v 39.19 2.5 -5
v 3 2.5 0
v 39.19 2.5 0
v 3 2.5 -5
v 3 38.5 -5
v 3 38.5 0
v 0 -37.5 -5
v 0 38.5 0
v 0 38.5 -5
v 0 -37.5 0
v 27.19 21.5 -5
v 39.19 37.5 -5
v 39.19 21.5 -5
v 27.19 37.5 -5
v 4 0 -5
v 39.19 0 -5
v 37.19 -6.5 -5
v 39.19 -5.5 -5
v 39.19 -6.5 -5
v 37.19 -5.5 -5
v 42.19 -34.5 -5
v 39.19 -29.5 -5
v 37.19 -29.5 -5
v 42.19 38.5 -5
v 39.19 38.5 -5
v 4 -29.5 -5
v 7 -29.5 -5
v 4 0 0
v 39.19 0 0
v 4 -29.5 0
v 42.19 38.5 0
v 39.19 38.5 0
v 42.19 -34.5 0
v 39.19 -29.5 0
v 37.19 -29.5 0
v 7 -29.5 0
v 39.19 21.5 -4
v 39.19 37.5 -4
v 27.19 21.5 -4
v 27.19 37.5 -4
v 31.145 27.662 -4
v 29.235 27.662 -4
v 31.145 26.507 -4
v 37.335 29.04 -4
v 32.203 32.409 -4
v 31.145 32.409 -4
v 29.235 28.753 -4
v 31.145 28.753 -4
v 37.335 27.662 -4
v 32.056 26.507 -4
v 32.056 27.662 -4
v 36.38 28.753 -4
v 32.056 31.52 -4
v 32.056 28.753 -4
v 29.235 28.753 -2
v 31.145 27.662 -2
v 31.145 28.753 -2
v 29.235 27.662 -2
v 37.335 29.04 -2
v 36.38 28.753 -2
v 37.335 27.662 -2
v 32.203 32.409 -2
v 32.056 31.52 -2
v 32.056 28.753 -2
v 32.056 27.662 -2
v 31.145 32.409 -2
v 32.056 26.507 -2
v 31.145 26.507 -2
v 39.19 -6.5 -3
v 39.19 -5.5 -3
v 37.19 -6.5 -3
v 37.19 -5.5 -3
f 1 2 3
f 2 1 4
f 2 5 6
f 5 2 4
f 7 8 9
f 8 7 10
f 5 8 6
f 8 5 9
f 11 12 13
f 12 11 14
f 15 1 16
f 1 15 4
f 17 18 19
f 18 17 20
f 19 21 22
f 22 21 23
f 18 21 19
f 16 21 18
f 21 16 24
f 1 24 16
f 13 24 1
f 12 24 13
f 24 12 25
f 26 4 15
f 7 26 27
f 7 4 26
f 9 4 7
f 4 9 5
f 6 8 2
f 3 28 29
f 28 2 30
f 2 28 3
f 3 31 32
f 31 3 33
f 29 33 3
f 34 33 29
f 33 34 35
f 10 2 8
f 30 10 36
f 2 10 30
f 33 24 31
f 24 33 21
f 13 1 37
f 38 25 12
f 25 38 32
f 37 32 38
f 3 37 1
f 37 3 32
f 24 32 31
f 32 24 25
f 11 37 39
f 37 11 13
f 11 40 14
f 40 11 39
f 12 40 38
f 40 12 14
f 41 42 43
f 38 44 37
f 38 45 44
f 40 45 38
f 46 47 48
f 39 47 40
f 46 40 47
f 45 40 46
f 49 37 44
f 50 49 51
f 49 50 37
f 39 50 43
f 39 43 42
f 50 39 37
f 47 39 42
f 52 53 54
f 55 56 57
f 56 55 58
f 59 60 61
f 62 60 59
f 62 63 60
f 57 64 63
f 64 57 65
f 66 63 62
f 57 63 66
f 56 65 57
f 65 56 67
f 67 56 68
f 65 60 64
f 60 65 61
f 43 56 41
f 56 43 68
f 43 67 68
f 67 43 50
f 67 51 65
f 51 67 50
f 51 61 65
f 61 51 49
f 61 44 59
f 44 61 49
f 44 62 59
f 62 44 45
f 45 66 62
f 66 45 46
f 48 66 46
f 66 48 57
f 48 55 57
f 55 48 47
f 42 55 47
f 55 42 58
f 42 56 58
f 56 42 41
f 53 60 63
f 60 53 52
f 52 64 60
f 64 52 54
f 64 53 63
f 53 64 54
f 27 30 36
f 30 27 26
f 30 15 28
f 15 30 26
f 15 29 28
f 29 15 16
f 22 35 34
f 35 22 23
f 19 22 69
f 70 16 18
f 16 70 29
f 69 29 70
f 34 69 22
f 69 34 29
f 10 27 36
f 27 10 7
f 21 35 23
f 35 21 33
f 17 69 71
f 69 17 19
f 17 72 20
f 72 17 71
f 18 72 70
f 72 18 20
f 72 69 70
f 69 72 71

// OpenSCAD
// This is, essentially, a complete re-do of this item on thingiverse:
// https://www.thingiverse.com/thing:1808029
//
// Bill Kearney, 2017
// NOT for commercial reproduction or use

// How much should the bed be raised? Use calipers to measure your glass thickness. Note: 1/8" = 3.175mm, 3/8" = 9.525mm
ADDED_BED_HEIGHT = 4; // [0.8, 1, 2, 3, 3.125, 3.175, 4, 5, 6, 9.525]

// How wide you want the spacer to be?  7mm is about the max.
SPACER_WIDTH = 5; // [5,6,7]

// How deep should the top hook be? 
TOP_HOOK_DEPTH = 2.0; // [2.0, 3.0, 4.0]
// How deep should the bottom hook be? 
BOTTOM_HOOK_DEPTH = 3.0; // [2.0, 3.0, 4.0]

// How far forward should the top hook extend? 
TOP_HOOK_LENGTH = 5.0; // [3.0, 4.0, 5.0]
// How far forward should the bottom hook extend? 
BOTTOM_HOOK_LENGTH = 8.0; // [5.0, 6.0, 7.0, 8.0]

// Add insertion levers on the back?  These let you insert and remove from the machine without taking it apart.
INCLUDE_LEVERS = 1; // [0,1]
// How far back should the levers extend? 
LEVER_LENGTH = 36;

// Add a flag showing the added height?  1=Show the size flag 0=Leave it off
INCLUDE_FLAG = 1; // [0,1]  

// Add a small pin to help hold the bracket in place?  1=Add a pin 0=No pin
INCLUDE_CATCH = 1; // [0,1]  
// Distance from back of gantry to indent for catch pin
CATCH_GAP = 5.5;
// Size of catch
CATCH_THICKNESS = 1;
// Width of catch
CATCH_WIDTH = 2;
// Depth of catch
CATCH_HEIGHT = 2;

// Vertical size of gantry bracket
GANTRY_HEIGHT = 35.19;
// Horizontal (front-back) size of gantry bracket
GANTRY_DEPTH = 29.5;

// Thickness of bottom lever
BOTTOM_THICKNESS = 3;
// Thickness of top lever
TOP_THICKNESS = 3;
// Thickness of upright post
UPRIGHT_THICKNESS = 2.5;

// How tall to make the added bed height number
FLAG_CHARACTER_SIZE = 8;  
// How far to make the number stand out from the flag
FLAG_EXTRUSION = 3;
// How tall to make the flag
FLAG_HEIGHT = 12; 
// How thick to make the flag
FLAG_THICKNESS = 1; 

// What font to use for the number?
FONT_NAME="Basic Sans Serif 7:style=Regular"; // ["Arial:style=Black","Arial:style=Narrow Bold","Basic Sans Serif 7:style=Regular","Candara","Chewy","Comic Sans MS","Liberation Sans"

//FONT_NAME="Arial:style=Black";
//FONT_NAME="Arial:style=Narrow Bold";
//FONT_NAME="Comic Sans MS";
//FONT_NAME="Liberation Sans";

module letter(l,s,x) {  // raised lettering 
    rotate([90,0,0])
    linear_extrude(height = x) {
        text(l, size = s, halign = "center", font = FONT_NAME, valign = "center", $fn = 32);
    }
}

module prism(l, w, h){  // tips on ends of brackets
       polyhedron(
               points=[[0,0,0], [l,0,0], [l,w,0], [0,w,0], [0,w,h], [l,w,h]],
               faces=[[0,1,2,3],[5,4,3,2],[0,4,5,1],[0,3,4],[5,2,1]]
               );
}

module make_bracket() {  // main routine to create the bracket
    rotate([-90,0,-90]){  // turned over onto the side to facilitate importing for 3D printing
        translate([0,0,0])
        cube([GANTRY_DEPTH,SPACER_WIDTH,ADDED_BED_HEIGHT], center=false);
        
        translate([-UPRIGHT_THICKNESS,0,0])
        cube([UPRIGHT_THICKNESS,SPACER_WIDTH,ADDED_BED_HEIGHT+GANTRY_HEIGHT+TOP_THICKNESS], center=false);
        
        translate([0,0,ADDED_BED_HEIGHT+GANTRY_HEIGHT])
        cube([GANTRY_DEPTH,SPACER_WIDTH,TOP_THICKNESS], center=false);

        // bottom hook
        translate([GANTRY_DEPTH+BOTTOM_HOOK_LENGTH,0,0])
        rotate([0,0,90])
        prism(SPACER_WIDTH,BOTTOM_HOOK_LENGTH,ADDED_BED_HEIGHT+BOTTOM_HOOK_DEPTH);
        
        // top hook
        translate([GANTRY_DEPTH+TOP_HOOK_LENGTH,SPACER_WIDTH,ADDED_BED_HEIGHT+GANTRY_HEIGHT+TOP_THICKNESS])
        rotate([0,180,90])
        prism(SPACER_WIDTH,TOP_HOOK_LENGTH,TOP_THICKNESS+TOP_HOOK_DEPTH);
        
        // I should note that my son, Will, got to file his first-ever bug report.
        // He asked me to try all kinds of crazy numbers for the various pieces.
        // During that process it was revealed I was using the wrong variable to calculate the top hook.
        // SQA to the rescue!
        
        if (INCLUDE_LEVERS){
            translate([-LEVER_LENGTH-UPRIGHT_THICKNESS,0,0])
            cube([LEVER_LENGTH,SPACER_WIDTH,BOTTOM_THICKNESS], center=false);

            translate([-LEVER_LENGTH-UPRIGHT_THICKNESS,0,ADDED_BED_HEIGHT+GANTRY_HEIGHT])
            cube([LEVER_LENGTH,SPACER_WIDTH,TOP_THICKNESS], center=false);
        }
        
        if (INCLUDE_FLAG){
            if (INCLUDE_LEVERS) {
                HEIGHT_LEN = len(str(ADDED_BED_HEIGHT));
                
                // so what is this clever bit of ? logic?  
                FLAG_WIDTH = HEIGHT_LEN > 1 ? FLAG_CHARACTER_SIZE * HEIGHT_LEN : FLAG_CHARACTER_SIZE * 2;
                // It's to work around openSCAD way of handling variable scopes
                // can't use an if{} scope because any changes would only work inside that scope
                // this way the FLAG_WIDTH can be changed on the fly
                                
                translate([-LEVER_LENGTH-UPRIGHT_THICKNESS+1,SPACER_WIDTH-FLAG_THICKNESS,ADDED_BED_HEIGHT+GANTRY_HEIGHT-FLAG_HEIGHT])
                difference() {
                    union() {
                        cube(size=[FLAG_WIDTH,FLAG_THICKNESS,FLAG_HEIGHT], center = false);
                        translate([FLAG_WIDTH/2,FLAG_THICKNESS,FLAG_HEIGHT/2]) letter(str(ADDED_BED_HEIGHT),FLAG_CHARACTER_SIZE,FLAG_EXTRUSION);
                    }
                }
                
            // I should probably refactor the flag code here into a function... some day...
            
            } else {
                HEIGHT_LEN = len(str(ADDED_BED_HEIGHT));
                
                FLAG_WIDTH = HEIGHT_LEN > 1 ? FLAG_CHARACTER_SIZE * HEIGHT_LEN : FLAG_CHARACTER_SIZE * 2;
                translate([-FLAG_HEIGHT-UPRIGHT_THICKNESS,SPACER_WIDTH-FLAG_THICKNESS,((ADDED_BED_HEIGHT+GANTRY_HEIGHT+TOP_THICKNESS)/2+(FLAG_WIDTH/2))])
                rotate([0,90,0])  //turn it to fit closer to the upright
                difference() {
                    union() {
                        cube(size=[FLAG_WIDTH,FLAG_THICKNESS,FLAG_HEIGHT], center = false);
                        translate([FLAG_WIDTH/2,FLAG_THICKNESS,FLAG_HEIGHT/2]) letter(str(ADDED_BED_HEIGHT),FLAG_CHARACTER_SIZE,FLAG_EXTRUSION);
                    }
                }
                
            }
        }
        if (INCLUDE_CATCH){
            translate([CATCH_GAP,SPACER_WIDTH-CATCH_WIDTH,ADDED_BED_HEIGHT+GANTRY_HEIGHT-CATCH_HEIGHT])
            cube(size=[CATCH_THICKNESS,CATCH_WIDTH,CATCH_HEIGHT], center = false);
        }
    }  // end of rotate{} scope to orient toward the bed for 3D printing
}

make_bracket();
